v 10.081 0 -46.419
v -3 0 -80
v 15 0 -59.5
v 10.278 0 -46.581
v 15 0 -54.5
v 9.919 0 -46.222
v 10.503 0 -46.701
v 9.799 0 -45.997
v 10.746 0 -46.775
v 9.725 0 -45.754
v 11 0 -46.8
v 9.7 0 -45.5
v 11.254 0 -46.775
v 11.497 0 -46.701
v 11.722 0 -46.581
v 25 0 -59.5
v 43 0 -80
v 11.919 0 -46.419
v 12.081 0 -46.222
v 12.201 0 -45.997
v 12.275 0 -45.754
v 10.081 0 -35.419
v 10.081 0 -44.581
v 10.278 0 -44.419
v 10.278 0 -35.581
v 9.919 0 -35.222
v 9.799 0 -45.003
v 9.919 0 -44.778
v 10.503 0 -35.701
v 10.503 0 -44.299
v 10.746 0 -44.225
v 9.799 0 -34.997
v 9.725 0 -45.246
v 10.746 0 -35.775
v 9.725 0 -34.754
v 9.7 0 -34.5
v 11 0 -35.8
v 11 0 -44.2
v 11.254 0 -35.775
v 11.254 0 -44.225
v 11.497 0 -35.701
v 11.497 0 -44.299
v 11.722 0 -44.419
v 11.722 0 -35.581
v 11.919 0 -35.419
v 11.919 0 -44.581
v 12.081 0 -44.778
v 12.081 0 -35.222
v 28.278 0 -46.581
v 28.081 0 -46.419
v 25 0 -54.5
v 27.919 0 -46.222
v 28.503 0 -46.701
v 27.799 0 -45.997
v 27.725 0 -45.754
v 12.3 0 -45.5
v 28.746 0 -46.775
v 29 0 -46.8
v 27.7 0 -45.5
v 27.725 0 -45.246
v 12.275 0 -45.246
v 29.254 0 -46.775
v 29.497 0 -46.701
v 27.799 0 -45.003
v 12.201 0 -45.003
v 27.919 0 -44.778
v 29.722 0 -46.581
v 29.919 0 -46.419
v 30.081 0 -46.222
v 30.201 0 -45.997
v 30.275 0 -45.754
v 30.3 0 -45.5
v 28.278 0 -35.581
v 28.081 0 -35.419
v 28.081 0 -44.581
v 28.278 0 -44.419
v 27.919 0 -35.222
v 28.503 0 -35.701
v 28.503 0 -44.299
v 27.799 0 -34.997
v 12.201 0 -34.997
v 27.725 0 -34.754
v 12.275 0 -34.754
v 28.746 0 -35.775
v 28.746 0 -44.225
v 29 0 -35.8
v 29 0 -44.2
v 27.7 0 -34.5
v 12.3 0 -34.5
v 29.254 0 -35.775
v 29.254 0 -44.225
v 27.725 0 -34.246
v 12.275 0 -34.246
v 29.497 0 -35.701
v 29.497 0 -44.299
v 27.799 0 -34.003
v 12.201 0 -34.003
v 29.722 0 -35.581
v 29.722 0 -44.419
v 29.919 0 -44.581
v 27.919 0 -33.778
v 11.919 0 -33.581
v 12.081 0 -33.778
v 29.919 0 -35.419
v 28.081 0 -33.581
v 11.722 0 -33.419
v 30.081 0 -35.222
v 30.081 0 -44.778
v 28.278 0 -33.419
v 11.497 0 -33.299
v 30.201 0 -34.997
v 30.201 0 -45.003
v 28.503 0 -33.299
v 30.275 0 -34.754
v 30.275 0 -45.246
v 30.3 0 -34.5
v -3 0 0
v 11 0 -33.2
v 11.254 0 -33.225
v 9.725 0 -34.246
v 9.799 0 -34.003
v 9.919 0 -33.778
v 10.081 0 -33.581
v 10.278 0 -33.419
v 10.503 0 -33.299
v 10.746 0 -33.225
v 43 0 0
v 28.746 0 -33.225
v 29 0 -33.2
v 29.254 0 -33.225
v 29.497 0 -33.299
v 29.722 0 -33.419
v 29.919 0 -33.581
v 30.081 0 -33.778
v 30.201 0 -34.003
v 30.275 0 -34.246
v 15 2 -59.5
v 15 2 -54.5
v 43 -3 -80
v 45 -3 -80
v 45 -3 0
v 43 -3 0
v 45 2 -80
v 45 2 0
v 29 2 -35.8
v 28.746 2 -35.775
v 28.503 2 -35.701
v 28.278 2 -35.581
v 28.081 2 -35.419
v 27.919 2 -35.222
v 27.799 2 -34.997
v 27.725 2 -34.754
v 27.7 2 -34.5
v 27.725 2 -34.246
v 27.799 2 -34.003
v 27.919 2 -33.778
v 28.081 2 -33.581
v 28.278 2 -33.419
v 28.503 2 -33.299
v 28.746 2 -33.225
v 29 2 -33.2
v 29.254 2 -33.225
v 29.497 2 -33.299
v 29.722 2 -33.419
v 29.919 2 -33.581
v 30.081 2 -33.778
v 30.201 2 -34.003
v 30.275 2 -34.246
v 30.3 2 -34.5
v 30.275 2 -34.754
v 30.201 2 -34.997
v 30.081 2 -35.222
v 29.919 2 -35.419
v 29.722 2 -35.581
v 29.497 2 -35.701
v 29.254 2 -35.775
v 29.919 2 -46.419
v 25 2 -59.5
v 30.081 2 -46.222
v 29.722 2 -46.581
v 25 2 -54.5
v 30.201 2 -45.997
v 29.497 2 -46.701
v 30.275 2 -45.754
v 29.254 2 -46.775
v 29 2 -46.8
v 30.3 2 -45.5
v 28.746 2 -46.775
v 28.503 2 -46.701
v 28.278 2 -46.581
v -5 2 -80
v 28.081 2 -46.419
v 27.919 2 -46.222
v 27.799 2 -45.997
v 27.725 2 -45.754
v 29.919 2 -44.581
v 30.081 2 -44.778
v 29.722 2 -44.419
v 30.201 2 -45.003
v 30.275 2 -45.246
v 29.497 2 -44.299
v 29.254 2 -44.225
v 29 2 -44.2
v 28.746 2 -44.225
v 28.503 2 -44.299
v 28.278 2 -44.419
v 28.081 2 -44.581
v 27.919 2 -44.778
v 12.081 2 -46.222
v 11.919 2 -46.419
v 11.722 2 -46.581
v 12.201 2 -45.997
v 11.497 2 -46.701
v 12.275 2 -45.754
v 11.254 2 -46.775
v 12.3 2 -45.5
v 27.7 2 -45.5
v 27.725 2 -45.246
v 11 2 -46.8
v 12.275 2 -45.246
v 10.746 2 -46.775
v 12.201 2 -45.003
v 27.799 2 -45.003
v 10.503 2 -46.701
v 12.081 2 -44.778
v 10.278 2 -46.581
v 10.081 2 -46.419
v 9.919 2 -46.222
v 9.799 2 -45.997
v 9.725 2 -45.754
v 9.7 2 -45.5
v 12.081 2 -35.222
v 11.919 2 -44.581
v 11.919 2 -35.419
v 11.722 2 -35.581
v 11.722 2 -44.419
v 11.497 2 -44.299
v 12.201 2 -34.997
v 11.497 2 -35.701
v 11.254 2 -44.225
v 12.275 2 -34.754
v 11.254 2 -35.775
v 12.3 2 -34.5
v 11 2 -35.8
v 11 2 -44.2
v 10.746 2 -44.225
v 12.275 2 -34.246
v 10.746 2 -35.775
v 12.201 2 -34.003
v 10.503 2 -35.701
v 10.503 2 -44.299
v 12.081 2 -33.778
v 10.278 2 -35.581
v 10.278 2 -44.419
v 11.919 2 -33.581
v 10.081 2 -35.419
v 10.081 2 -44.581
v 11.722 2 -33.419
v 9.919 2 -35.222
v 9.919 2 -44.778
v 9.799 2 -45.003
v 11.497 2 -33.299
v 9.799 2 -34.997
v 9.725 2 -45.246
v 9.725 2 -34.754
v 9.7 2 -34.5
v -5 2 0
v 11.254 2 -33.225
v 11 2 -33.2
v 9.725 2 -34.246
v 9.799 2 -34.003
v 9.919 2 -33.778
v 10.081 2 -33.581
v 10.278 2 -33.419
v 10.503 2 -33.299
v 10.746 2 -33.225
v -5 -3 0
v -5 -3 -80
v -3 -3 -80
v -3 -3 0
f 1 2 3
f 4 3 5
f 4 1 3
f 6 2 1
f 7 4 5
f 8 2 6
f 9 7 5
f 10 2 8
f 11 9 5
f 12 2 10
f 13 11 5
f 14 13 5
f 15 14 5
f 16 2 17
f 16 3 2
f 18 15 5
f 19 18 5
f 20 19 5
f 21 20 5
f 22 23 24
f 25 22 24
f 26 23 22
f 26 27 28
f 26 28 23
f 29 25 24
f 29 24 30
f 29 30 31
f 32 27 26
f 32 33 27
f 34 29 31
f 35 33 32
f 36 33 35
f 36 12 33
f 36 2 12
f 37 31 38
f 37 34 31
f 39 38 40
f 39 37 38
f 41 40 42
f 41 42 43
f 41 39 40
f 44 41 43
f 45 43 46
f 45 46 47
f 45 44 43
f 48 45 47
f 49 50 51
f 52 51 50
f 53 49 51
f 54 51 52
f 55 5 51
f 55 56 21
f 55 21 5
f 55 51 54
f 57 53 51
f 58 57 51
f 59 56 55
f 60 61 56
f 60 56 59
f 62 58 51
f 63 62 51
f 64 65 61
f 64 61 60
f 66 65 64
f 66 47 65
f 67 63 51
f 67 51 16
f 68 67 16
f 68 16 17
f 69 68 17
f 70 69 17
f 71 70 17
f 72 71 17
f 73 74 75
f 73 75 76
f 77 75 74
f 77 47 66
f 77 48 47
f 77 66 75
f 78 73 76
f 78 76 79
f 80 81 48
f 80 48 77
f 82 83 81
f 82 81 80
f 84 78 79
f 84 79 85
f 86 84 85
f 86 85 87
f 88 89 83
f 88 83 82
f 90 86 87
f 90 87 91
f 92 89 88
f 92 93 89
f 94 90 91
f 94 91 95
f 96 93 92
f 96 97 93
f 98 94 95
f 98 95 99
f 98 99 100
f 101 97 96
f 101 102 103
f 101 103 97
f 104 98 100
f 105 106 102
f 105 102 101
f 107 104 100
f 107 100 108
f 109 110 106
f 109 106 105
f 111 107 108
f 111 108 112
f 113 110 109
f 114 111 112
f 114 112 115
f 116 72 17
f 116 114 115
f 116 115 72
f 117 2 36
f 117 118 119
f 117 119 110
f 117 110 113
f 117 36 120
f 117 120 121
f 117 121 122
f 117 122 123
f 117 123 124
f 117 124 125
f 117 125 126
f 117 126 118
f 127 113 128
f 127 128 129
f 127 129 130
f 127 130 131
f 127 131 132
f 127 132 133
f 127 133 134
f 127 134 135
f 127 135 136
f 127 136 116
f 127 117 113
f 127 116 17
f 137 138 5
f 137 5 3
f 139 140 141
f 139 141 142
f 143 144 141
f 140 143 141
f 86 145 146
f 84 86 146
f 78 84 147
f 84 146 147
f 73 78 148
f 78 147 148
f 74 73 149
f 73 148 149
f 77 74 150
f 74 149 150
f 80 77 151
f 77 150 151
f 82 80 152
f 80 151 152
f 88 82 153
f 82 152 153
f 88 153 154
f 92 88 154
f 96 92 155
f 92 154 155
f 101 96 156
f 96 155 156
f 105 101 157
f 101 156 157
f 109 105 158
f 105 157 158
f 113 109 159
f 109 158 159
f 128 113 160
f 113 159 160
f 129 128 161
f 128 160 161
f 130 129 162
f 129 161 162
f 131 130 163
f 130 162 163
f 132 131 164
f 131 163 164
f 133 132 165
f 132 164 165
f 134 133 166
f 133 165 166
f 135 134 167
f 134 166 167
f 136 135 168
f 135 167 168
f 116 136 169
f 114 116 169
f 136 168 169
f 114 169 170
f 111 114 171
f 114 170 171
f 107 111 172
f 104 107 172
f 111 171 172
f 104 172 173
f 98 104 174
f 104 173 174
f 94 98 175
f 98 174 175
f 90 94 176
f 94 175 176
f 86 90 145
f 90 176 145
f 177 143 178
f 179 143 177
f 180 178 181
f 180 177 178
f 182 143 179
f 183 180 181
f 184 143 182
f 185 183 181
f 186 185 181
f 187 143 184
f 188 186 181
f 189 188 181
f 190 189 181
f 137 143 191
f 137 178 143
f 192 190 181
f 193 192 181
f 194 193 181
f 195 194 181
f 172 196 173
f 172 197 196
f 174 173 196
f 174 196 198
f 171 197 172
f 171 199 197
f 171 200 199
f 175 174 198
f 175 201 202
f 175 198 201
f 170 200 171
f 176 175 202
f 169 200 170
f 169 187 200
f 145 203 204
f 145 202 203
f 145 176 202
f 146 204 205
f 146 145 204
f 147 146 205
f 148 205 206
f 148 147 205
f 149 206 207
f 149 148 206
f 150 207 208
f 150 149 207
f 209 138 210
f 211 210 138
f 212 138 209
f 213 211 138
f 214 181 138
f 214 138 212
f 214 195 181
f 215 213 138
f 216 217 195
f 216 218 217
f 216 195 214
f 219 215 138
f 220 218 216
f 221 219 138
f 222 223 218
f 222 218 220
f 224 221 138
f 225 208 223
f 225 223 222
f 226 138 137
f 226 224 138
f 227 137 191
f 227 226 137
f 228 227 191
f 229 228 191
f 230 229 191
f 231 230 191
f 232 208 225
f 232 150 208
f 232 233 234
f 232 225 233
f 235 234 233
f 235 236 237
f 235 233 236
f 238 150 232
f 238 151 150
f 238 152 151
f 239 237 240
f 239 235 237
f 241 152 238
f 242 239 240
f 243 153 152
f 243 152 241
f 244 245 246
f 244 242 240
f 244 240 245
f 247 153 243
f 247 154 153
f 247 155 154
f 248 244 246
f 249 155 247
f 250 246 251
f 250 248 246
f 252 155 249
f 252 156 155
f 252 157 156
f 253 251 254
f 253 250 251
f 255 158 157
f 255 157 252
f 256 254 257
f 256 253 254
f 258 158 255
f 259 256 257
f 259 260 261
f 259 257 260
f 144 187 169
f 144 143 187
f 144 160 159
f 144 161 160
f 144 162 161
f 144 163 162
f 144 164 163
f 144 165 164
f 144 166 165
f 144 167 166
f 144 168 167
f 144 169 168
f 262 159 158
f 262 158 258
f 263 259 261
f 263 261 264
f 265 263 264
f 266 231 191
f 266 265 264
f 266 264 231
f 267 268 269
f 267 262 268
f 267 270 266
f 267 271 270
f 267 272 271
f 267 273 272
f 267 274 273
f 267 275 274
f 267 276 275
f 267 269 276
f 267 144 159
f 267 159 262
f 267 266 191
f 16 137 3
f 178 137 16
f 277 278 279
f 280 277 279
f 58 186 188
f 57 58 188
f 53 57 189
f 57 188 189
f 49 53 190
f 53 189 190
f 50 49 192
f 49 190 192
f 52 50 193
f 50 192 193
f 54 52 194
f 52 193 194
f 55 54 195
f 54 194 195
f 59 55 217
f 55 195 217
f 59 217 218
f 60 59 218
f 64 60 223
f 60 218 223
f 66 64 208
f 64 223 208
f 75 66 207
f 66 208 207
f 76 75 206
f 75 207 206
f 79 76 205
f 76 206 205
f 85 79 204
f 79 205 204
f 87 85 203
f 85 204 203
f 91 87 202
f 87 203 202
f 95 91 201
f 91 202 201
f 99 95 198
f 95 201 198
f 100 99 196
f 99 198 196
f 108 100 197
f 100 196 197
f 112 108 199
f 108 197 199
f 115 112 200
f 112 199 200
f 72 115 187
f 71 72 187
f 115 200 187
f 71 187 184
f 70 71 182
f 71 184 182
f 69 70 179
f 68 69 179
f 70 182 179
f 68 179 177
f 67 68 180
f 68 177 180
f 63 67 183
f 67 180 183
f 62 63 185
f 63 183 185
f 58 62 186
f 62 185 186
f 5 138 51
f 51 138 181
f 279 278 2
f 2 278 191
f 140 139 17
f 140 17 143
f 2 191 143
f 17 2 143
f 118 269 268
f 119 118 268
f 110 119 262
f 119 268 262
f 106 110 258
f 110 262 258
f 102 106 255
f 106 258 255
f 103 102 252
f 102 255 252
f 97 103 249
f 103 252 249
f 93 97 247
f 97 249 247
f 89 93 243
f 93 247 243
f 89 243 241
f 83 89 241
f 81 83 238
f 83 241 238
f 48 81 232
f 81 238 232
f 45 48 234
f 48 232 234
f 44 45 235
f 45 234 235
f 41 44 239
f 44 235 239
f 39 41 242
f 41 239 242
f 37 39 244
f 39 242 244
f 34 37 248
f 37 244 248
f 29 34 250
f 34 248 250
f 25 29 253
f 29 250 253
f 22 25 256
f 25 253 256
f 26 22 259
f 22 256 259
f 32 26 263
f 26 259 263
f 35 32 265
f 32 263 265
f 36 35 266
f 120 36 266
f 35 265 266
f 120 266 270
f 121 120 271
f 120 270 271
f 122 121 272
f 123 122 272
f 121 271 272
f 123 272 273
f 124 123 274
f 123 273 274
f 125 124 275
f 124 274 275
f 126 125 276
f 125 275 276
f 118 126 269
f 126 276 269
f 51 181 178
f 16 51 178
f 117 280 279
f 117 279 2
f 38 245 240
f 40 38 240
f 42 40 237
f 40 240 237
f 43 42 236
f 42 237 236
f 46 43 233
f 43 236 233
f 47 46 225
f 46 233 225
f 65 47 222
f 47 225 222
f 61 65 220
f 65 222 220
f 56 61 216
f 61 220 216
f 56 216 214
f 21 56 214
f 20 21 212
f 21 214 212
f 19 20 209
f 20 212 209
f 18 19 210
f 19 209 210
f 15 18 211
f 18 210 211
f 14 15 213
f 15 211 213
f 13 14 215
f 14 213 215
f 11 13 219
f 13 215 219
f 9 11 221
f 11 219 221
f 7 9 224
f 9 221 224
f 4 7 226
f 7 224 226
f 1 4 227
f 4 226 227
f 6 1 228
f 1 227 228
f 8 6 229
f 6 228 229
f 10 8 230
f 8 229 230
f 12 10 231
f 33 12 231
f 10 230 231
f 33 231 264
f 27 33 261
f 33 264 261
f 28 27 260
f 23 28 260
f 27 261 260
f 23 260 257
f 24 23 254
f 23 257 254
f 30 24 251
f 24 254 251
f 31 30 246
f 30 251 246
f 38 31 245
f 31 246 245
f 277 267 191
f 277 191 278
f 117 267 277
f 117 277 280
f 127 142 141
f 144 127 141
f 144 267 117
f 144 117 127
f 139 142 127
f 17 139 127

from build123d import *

# Parameters (mm, degrees)
SKETCH1_W           = 40
SKETCH1_H           = 80
BOSS_EXTRUDE1_DEPTH = 2
BOSS_EXTRUDE2_DEPTH = 80
SKETCH3_R           = 1.3
SKETCH3_W           = 10
SKETCH3_H           = 5
CUT_EXTRUDE1_DEPTH  = 2


with BuildPart() as part:
    # Sketch1 → Boss-Extrude1 (new body)
    with BuildSketch(Plane(origin=(0, 0, 0), x_dir=(1, 0, 0), z_dir=(0, 1, 0))):
        with Locations((20, 40)):
            Rectangle(SKETCH1_W, SKETCH1_H)
    extrude(amount=BOSS_EXTRUDE1_DEPTH)

    # Sketch2 → Boss-Extrude2 (add)
    with BuildSketch(Plane.XY):
        Polygon((0, 2), (-5, 2), (-5, -3), (-3, -3), (-3, 0), (0, 0), align=None)
        Polygon((43, 0), (40, 0), (40, 2), (45, 2), (45, -3), (43, -3), align=None)
    extrude(amount=-BOSS_EXTRUDE2_DEPTH)

    # Sketch3 → Cut-Extrude1 (cut)
    with BuildSketch(Plane(origin=(0, 2, 0), x_dir=(1, 0, 0), z_dir=(0, 1, 0))):
        with Locations(Location((11, 45.5, 0), (0, 0, 270))):
            Circle(SKETCH3_R)
        with Locations(Location((11, 34.5, 0), (0, 0, 270))):
            Circle(SKETCH3_R)
        with Locations(Location((29, 45.5, 0), (0, 0, 90))):
            Circle(SKETCH3_R)
        with Locations(Location((29, 34.5, 0), (0, 0, 90))):
            Circle(SKETCH3_R)
        with Locations((20, 57)):
            Rectangle(SKETCH3_W, SKETCH3_H)
    extrude(amount=-CUT_EXTRUDE1_DEPTH, mode=Mode.SUBTRACT)


solid = part.part
